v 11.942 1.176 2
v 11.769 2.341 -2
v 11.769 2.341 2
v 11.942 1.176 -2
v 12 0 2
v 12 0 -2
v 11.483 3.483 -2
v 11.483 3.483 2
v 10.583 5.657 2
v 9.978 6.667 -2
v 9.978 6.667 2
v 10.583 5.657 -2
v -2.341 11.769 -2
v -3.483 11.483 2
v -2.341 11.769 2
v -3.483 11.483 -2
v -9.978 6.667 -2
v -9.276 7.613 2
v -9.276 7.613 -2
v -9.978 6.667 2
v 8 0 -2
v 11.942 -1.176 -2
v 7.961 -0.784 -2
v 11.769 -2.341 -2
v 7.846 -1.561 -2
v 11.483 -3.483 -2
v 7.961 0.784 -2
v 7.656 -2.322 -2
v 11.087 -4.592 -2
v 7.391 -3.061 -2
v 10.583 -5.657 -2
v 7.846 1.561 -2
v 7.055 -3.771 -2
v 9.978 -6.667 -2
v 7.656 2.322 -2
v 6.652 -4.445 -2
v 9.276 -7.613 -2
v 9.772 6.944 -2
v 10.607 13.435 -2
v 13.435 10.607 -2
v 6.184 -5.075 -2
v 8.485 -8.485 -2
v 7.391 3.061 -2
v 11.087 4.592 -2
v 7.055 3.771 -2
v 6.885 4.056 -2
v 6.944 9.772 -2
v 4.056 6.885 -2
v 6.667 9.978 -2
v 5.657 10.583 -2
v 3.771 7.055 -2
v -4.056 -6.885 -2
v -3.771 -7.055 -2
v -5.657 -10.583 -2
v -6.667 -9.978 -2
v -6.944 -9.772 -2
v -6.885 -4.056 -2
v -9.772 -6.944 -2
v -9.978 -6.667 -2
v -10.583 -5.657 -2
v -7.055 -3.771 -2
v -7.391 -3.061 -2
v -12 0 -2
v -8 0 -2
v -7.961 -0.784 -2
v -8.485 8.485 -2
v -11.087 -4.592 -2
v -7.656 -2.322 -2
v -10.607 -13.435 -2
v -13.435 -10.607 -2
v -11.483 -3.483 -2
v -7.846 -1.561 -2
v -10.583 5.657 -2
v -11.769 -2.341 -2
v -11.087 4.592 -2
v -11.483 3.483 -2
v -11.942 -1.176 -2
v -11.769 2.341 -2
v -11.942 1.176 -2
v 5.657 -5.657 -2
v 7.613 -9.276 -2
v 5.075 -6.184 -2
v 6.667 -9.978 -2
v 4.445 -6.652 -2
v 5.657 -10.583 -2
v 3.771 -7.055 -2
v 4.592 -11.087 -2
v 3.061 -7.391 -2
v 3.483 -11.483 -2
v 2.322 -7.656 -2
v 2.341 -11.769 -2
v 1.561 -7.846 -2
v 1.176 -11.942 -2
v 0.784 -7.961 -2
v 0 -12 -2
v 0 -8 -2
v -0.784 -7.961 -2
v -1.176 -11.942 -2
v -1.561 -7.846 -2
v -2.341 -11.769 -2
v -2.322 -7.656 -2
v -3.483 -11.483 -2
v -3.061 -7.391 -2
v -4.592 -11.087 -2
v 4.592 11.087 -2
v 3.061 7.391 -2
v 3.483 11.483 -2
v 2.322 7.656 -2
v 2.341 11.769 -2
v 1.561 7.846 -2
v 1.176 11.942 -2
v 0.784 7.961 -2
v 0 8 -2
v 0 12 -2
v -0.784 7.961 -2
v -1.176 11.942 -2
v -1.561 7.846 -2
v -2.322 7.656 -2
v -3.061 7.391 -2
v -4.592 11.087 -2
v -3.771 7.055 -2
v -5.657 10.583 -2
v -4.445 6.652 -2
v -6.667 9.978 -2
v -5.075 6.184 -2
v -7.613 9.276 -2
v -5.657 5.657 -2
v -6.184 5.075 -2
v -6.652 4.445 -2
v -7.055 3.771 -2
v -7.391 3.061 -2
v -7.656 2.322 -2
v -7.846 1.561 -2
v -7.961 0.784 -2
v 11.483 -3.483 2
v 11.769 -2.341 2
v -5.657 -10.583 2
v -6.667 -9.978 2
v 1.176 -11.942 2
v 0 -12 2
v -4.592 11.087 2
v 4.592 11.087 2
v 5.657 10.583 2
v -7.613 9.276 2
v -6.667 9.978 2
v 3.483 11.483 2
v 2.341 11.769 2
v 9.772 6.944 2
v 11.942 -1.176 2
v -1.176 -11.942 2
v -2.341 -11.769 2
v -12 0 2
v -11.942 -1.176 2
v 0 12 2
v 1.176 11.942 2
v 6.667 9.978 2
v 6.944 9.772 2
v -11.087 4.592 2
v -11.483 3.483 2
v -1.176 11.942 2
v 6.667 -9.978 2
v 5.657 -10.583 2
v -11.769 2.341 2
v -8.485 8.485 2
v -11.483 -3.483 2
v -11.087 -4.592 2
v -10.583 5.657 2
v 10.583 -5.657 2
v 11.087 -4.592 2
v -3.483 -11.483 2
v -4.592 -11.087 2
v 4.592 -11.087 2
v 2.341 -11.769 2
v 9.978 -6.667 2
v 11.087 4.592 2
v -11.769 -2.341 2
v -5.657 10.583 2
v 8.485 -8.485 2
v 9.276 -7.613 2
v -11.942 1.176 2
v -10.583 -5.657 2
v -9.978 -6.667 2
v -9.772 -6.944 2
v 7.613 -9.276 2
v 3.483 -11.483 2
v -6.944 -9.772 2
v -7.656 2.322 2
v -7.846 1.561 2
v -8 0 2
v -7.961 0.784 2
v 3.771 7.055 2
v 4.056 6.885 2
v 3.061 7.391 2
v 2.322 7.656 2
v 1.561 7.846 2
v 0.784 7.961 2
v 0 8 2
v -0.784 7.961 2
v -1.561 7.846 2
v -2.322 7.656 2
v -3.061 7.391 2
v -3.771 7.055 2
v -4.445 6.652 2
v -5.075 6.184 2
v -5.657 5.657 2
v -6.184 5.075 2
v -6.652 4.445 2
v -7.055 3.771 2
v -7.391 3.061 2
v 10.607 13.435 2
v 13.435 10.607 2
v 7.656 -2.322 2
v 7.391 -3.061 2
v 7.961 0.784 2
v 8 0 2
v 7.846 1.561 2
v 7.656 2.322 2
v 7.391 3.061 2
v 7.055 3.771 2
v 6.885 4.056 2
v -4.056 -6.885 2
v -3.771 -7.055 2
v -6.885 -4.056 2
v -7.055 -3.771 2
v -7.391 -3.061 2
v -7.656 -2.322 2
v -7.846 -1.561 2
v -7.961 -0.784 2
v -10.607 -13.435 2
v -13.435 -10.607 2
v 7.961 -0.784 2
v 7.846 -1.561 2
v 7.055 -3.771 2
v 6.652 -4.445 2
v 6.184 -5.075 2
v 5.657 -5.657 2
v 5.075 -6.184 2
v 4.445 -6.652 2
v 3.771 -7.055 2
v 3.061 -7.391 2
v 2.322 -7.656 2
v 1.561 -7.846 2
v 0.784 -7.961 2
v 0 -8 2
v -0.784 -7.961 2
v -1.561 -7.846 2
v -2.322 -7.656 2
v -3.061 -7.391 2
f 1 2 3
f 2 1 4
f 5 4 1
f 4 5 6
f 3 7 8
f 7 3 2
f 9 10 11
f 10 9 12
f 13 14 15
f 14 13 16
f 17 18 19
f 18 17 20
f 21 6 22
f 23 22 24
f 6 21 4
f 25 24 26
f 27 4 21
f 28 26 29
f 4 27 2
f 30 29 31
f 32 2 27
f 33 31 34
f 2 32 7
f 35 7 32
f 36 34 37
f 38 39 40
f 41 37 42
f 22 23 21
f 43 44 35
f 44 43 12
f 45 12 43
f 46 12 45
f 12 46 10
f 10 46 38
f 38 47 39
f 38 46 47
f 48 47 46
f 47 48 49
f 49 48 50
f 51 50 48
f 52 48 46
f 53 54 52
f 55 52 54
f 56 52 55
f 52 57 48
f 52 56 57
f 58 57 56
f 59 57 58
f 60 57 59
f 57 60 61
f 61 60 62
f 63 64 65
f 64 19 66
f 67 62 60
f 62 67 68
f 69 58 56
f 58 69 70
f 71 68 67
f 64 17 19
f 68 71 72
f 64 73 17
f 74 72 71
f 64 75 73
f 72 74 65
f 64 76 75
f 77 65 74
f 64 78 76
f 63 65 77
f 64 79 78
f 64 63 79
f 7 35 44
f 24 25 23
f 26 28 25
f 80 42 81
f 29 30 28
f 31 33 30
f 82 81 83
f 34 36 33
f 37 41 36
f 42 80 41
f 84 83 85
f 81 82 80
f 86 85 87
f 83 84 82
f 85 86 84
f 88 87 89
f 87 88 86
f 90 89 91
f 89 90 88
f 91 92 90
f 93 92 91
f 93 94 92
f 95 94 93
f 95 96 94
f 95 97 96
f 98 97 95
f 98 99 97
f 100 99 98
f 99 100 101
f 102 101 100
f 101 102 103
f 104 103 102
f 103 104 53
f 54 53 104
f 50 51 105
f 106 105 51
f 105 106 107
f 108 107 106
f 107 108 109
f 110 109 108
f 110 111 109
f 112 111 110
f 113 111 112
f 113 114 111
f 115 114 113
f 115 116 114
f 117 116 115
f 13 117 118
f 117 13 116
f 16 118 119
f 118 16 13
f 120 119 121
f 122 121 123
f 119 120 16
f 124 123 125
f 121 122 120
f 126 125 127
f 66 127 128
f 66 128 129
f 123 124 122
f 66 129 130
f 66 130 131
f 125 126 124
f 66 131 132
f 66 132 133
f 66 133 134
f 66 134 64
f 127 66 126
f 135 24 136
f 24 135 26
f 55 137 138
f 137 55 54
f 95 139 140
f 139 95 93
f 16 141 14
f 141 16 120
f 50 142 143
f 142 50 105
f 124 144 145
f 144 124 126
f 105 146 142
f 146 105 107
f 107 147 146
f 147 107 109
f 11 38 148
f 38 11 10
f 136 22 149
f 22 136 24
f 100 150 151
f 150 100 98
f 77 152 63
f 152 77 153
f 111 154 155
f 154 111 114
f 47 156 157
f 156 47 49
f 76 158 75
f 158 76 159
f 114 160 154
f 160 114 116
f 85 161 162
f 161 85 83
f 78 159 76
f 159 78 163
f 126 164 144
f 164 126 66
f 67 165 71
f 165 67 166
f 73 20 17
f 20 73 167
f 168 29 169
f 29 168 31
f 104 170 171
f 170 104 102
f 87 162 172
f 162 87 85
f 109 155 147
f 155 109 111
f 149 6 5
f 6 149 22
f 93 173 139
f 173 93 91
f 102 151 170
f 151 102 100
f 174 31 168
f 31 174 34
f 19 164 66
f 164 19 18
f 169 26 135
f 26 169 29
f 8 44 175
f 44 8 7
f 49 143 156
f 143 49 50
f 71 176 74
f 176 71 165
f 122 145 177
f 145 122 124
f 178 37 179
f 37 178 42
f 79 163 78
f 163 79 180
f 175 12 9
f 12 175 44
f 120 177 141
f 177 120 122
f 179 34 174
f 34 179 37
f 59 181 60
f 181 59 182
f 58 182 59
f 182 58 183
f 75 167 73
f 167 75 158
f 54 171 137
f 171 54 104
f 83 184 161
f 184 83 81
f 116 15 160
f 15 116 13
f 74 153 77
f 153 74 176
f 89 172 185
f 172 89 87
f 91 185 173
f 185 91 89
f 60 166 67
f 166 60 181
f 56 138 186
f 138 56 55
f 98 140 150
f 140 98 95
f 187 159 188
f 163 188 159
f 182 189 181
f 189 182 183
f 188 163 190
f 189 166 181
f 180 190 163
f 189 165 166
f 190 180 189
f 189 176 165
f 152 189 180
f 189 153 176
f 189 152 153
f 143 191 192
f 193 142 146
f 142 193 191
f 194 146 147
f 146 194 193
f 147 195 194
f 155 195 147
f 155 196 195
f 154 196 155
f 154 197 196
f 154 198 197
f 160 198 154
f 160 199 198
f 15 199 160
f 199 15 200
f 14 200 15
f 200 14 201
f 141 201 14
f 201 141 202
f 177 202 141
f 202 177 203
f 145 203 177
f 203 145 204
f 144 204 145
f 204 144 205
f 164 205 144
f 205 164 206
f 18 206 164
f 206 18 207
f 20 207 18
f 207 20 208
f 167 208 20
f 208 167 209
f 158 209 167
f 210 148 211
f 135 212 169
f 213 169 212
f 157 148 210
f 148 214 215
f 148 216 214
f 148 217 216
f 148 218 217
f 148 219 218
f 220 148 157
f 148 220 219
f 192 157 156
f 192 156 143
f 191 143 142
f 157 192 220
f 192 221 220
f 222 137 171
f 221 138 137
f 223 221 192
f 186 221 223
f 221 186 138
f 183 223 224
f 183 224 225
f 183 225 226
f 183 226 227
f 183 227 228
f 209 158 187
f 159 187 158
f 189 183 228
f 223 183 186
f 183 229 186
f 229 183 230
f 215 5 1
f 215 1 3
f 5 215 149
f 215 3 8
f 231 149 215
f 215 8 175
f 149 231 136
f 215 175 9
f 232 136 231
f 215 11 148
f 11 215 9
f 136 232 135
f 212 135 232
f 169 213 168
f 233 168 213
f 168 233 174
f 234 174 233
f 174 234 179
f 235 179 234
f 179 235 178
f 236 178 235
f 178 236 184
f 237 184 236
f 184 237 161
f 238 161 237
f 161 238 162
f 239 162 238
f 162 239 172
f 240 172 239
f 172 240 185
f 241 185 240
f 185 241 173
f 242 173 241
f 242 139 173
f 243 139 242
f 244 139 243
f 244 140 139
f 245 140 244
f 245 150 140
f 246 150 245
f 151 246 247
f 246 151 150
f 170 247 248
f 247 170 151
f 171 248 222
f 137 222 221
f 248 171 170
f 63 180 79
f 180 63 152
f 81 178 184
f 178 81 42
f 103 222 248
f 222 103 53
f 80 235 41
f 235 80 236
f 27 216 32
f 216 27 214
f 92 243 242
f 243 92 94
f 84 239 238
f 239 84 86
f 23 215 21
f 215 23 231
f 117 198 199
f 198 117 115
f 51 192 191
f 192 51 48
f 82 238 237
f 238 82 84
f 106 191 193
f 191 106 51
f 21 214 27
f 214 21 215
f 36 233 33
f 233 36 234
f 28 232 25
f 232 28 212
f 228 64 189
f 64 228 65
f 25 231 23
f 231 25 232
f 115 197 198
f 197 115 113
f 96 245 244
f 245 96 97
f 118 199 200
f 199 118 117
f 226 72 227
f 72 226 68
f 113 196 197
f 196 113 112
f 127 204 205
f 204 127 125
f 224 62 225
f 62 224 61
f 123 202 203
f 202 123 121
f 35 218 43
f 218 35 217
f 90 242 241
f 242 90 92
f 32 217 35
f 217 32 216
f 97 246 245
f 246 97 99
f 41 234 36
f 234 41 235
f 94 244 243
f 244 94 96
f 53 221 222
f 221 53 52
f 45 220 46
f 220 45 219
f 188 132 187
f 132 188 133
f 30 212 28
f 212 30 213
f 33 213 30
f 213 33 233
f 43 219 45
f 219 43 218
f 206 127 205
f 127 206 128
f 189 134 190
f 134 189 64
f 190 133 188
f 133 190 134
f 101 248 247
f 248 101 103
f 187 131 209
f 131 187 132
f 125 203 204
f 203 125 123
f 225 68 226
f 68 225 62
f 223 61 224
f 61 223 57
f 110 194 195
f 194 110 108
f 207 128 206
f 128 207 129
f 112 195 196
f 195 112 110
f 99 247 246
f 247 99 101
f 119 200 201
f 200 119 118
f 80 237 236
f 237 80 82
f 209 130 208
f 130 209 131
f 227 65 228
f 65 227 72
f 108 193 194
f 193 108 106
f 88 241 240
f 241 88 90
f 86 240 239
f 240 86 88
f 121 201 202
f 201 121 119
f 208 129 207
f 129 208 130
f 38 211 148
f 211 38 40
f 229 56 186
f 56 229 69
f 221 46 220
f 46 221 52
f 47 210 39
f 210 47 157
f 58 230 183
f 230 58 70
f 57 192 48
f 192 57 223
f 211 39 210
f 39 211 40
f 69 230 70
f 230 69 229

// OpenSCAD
//=============================================================================
// Icon used when there is no operation available: a null sign.
//=============================================================================

module NullIcon() {
  difference() {
    cylinder(r = 12, h = 4, center = true);
    cylinder(r =  8, h = 6, center = true);
  }
  rotate([0, 0, -45]) cube([4, 34, 4], center = true);
}

$fn = 64;
NullIcon();
